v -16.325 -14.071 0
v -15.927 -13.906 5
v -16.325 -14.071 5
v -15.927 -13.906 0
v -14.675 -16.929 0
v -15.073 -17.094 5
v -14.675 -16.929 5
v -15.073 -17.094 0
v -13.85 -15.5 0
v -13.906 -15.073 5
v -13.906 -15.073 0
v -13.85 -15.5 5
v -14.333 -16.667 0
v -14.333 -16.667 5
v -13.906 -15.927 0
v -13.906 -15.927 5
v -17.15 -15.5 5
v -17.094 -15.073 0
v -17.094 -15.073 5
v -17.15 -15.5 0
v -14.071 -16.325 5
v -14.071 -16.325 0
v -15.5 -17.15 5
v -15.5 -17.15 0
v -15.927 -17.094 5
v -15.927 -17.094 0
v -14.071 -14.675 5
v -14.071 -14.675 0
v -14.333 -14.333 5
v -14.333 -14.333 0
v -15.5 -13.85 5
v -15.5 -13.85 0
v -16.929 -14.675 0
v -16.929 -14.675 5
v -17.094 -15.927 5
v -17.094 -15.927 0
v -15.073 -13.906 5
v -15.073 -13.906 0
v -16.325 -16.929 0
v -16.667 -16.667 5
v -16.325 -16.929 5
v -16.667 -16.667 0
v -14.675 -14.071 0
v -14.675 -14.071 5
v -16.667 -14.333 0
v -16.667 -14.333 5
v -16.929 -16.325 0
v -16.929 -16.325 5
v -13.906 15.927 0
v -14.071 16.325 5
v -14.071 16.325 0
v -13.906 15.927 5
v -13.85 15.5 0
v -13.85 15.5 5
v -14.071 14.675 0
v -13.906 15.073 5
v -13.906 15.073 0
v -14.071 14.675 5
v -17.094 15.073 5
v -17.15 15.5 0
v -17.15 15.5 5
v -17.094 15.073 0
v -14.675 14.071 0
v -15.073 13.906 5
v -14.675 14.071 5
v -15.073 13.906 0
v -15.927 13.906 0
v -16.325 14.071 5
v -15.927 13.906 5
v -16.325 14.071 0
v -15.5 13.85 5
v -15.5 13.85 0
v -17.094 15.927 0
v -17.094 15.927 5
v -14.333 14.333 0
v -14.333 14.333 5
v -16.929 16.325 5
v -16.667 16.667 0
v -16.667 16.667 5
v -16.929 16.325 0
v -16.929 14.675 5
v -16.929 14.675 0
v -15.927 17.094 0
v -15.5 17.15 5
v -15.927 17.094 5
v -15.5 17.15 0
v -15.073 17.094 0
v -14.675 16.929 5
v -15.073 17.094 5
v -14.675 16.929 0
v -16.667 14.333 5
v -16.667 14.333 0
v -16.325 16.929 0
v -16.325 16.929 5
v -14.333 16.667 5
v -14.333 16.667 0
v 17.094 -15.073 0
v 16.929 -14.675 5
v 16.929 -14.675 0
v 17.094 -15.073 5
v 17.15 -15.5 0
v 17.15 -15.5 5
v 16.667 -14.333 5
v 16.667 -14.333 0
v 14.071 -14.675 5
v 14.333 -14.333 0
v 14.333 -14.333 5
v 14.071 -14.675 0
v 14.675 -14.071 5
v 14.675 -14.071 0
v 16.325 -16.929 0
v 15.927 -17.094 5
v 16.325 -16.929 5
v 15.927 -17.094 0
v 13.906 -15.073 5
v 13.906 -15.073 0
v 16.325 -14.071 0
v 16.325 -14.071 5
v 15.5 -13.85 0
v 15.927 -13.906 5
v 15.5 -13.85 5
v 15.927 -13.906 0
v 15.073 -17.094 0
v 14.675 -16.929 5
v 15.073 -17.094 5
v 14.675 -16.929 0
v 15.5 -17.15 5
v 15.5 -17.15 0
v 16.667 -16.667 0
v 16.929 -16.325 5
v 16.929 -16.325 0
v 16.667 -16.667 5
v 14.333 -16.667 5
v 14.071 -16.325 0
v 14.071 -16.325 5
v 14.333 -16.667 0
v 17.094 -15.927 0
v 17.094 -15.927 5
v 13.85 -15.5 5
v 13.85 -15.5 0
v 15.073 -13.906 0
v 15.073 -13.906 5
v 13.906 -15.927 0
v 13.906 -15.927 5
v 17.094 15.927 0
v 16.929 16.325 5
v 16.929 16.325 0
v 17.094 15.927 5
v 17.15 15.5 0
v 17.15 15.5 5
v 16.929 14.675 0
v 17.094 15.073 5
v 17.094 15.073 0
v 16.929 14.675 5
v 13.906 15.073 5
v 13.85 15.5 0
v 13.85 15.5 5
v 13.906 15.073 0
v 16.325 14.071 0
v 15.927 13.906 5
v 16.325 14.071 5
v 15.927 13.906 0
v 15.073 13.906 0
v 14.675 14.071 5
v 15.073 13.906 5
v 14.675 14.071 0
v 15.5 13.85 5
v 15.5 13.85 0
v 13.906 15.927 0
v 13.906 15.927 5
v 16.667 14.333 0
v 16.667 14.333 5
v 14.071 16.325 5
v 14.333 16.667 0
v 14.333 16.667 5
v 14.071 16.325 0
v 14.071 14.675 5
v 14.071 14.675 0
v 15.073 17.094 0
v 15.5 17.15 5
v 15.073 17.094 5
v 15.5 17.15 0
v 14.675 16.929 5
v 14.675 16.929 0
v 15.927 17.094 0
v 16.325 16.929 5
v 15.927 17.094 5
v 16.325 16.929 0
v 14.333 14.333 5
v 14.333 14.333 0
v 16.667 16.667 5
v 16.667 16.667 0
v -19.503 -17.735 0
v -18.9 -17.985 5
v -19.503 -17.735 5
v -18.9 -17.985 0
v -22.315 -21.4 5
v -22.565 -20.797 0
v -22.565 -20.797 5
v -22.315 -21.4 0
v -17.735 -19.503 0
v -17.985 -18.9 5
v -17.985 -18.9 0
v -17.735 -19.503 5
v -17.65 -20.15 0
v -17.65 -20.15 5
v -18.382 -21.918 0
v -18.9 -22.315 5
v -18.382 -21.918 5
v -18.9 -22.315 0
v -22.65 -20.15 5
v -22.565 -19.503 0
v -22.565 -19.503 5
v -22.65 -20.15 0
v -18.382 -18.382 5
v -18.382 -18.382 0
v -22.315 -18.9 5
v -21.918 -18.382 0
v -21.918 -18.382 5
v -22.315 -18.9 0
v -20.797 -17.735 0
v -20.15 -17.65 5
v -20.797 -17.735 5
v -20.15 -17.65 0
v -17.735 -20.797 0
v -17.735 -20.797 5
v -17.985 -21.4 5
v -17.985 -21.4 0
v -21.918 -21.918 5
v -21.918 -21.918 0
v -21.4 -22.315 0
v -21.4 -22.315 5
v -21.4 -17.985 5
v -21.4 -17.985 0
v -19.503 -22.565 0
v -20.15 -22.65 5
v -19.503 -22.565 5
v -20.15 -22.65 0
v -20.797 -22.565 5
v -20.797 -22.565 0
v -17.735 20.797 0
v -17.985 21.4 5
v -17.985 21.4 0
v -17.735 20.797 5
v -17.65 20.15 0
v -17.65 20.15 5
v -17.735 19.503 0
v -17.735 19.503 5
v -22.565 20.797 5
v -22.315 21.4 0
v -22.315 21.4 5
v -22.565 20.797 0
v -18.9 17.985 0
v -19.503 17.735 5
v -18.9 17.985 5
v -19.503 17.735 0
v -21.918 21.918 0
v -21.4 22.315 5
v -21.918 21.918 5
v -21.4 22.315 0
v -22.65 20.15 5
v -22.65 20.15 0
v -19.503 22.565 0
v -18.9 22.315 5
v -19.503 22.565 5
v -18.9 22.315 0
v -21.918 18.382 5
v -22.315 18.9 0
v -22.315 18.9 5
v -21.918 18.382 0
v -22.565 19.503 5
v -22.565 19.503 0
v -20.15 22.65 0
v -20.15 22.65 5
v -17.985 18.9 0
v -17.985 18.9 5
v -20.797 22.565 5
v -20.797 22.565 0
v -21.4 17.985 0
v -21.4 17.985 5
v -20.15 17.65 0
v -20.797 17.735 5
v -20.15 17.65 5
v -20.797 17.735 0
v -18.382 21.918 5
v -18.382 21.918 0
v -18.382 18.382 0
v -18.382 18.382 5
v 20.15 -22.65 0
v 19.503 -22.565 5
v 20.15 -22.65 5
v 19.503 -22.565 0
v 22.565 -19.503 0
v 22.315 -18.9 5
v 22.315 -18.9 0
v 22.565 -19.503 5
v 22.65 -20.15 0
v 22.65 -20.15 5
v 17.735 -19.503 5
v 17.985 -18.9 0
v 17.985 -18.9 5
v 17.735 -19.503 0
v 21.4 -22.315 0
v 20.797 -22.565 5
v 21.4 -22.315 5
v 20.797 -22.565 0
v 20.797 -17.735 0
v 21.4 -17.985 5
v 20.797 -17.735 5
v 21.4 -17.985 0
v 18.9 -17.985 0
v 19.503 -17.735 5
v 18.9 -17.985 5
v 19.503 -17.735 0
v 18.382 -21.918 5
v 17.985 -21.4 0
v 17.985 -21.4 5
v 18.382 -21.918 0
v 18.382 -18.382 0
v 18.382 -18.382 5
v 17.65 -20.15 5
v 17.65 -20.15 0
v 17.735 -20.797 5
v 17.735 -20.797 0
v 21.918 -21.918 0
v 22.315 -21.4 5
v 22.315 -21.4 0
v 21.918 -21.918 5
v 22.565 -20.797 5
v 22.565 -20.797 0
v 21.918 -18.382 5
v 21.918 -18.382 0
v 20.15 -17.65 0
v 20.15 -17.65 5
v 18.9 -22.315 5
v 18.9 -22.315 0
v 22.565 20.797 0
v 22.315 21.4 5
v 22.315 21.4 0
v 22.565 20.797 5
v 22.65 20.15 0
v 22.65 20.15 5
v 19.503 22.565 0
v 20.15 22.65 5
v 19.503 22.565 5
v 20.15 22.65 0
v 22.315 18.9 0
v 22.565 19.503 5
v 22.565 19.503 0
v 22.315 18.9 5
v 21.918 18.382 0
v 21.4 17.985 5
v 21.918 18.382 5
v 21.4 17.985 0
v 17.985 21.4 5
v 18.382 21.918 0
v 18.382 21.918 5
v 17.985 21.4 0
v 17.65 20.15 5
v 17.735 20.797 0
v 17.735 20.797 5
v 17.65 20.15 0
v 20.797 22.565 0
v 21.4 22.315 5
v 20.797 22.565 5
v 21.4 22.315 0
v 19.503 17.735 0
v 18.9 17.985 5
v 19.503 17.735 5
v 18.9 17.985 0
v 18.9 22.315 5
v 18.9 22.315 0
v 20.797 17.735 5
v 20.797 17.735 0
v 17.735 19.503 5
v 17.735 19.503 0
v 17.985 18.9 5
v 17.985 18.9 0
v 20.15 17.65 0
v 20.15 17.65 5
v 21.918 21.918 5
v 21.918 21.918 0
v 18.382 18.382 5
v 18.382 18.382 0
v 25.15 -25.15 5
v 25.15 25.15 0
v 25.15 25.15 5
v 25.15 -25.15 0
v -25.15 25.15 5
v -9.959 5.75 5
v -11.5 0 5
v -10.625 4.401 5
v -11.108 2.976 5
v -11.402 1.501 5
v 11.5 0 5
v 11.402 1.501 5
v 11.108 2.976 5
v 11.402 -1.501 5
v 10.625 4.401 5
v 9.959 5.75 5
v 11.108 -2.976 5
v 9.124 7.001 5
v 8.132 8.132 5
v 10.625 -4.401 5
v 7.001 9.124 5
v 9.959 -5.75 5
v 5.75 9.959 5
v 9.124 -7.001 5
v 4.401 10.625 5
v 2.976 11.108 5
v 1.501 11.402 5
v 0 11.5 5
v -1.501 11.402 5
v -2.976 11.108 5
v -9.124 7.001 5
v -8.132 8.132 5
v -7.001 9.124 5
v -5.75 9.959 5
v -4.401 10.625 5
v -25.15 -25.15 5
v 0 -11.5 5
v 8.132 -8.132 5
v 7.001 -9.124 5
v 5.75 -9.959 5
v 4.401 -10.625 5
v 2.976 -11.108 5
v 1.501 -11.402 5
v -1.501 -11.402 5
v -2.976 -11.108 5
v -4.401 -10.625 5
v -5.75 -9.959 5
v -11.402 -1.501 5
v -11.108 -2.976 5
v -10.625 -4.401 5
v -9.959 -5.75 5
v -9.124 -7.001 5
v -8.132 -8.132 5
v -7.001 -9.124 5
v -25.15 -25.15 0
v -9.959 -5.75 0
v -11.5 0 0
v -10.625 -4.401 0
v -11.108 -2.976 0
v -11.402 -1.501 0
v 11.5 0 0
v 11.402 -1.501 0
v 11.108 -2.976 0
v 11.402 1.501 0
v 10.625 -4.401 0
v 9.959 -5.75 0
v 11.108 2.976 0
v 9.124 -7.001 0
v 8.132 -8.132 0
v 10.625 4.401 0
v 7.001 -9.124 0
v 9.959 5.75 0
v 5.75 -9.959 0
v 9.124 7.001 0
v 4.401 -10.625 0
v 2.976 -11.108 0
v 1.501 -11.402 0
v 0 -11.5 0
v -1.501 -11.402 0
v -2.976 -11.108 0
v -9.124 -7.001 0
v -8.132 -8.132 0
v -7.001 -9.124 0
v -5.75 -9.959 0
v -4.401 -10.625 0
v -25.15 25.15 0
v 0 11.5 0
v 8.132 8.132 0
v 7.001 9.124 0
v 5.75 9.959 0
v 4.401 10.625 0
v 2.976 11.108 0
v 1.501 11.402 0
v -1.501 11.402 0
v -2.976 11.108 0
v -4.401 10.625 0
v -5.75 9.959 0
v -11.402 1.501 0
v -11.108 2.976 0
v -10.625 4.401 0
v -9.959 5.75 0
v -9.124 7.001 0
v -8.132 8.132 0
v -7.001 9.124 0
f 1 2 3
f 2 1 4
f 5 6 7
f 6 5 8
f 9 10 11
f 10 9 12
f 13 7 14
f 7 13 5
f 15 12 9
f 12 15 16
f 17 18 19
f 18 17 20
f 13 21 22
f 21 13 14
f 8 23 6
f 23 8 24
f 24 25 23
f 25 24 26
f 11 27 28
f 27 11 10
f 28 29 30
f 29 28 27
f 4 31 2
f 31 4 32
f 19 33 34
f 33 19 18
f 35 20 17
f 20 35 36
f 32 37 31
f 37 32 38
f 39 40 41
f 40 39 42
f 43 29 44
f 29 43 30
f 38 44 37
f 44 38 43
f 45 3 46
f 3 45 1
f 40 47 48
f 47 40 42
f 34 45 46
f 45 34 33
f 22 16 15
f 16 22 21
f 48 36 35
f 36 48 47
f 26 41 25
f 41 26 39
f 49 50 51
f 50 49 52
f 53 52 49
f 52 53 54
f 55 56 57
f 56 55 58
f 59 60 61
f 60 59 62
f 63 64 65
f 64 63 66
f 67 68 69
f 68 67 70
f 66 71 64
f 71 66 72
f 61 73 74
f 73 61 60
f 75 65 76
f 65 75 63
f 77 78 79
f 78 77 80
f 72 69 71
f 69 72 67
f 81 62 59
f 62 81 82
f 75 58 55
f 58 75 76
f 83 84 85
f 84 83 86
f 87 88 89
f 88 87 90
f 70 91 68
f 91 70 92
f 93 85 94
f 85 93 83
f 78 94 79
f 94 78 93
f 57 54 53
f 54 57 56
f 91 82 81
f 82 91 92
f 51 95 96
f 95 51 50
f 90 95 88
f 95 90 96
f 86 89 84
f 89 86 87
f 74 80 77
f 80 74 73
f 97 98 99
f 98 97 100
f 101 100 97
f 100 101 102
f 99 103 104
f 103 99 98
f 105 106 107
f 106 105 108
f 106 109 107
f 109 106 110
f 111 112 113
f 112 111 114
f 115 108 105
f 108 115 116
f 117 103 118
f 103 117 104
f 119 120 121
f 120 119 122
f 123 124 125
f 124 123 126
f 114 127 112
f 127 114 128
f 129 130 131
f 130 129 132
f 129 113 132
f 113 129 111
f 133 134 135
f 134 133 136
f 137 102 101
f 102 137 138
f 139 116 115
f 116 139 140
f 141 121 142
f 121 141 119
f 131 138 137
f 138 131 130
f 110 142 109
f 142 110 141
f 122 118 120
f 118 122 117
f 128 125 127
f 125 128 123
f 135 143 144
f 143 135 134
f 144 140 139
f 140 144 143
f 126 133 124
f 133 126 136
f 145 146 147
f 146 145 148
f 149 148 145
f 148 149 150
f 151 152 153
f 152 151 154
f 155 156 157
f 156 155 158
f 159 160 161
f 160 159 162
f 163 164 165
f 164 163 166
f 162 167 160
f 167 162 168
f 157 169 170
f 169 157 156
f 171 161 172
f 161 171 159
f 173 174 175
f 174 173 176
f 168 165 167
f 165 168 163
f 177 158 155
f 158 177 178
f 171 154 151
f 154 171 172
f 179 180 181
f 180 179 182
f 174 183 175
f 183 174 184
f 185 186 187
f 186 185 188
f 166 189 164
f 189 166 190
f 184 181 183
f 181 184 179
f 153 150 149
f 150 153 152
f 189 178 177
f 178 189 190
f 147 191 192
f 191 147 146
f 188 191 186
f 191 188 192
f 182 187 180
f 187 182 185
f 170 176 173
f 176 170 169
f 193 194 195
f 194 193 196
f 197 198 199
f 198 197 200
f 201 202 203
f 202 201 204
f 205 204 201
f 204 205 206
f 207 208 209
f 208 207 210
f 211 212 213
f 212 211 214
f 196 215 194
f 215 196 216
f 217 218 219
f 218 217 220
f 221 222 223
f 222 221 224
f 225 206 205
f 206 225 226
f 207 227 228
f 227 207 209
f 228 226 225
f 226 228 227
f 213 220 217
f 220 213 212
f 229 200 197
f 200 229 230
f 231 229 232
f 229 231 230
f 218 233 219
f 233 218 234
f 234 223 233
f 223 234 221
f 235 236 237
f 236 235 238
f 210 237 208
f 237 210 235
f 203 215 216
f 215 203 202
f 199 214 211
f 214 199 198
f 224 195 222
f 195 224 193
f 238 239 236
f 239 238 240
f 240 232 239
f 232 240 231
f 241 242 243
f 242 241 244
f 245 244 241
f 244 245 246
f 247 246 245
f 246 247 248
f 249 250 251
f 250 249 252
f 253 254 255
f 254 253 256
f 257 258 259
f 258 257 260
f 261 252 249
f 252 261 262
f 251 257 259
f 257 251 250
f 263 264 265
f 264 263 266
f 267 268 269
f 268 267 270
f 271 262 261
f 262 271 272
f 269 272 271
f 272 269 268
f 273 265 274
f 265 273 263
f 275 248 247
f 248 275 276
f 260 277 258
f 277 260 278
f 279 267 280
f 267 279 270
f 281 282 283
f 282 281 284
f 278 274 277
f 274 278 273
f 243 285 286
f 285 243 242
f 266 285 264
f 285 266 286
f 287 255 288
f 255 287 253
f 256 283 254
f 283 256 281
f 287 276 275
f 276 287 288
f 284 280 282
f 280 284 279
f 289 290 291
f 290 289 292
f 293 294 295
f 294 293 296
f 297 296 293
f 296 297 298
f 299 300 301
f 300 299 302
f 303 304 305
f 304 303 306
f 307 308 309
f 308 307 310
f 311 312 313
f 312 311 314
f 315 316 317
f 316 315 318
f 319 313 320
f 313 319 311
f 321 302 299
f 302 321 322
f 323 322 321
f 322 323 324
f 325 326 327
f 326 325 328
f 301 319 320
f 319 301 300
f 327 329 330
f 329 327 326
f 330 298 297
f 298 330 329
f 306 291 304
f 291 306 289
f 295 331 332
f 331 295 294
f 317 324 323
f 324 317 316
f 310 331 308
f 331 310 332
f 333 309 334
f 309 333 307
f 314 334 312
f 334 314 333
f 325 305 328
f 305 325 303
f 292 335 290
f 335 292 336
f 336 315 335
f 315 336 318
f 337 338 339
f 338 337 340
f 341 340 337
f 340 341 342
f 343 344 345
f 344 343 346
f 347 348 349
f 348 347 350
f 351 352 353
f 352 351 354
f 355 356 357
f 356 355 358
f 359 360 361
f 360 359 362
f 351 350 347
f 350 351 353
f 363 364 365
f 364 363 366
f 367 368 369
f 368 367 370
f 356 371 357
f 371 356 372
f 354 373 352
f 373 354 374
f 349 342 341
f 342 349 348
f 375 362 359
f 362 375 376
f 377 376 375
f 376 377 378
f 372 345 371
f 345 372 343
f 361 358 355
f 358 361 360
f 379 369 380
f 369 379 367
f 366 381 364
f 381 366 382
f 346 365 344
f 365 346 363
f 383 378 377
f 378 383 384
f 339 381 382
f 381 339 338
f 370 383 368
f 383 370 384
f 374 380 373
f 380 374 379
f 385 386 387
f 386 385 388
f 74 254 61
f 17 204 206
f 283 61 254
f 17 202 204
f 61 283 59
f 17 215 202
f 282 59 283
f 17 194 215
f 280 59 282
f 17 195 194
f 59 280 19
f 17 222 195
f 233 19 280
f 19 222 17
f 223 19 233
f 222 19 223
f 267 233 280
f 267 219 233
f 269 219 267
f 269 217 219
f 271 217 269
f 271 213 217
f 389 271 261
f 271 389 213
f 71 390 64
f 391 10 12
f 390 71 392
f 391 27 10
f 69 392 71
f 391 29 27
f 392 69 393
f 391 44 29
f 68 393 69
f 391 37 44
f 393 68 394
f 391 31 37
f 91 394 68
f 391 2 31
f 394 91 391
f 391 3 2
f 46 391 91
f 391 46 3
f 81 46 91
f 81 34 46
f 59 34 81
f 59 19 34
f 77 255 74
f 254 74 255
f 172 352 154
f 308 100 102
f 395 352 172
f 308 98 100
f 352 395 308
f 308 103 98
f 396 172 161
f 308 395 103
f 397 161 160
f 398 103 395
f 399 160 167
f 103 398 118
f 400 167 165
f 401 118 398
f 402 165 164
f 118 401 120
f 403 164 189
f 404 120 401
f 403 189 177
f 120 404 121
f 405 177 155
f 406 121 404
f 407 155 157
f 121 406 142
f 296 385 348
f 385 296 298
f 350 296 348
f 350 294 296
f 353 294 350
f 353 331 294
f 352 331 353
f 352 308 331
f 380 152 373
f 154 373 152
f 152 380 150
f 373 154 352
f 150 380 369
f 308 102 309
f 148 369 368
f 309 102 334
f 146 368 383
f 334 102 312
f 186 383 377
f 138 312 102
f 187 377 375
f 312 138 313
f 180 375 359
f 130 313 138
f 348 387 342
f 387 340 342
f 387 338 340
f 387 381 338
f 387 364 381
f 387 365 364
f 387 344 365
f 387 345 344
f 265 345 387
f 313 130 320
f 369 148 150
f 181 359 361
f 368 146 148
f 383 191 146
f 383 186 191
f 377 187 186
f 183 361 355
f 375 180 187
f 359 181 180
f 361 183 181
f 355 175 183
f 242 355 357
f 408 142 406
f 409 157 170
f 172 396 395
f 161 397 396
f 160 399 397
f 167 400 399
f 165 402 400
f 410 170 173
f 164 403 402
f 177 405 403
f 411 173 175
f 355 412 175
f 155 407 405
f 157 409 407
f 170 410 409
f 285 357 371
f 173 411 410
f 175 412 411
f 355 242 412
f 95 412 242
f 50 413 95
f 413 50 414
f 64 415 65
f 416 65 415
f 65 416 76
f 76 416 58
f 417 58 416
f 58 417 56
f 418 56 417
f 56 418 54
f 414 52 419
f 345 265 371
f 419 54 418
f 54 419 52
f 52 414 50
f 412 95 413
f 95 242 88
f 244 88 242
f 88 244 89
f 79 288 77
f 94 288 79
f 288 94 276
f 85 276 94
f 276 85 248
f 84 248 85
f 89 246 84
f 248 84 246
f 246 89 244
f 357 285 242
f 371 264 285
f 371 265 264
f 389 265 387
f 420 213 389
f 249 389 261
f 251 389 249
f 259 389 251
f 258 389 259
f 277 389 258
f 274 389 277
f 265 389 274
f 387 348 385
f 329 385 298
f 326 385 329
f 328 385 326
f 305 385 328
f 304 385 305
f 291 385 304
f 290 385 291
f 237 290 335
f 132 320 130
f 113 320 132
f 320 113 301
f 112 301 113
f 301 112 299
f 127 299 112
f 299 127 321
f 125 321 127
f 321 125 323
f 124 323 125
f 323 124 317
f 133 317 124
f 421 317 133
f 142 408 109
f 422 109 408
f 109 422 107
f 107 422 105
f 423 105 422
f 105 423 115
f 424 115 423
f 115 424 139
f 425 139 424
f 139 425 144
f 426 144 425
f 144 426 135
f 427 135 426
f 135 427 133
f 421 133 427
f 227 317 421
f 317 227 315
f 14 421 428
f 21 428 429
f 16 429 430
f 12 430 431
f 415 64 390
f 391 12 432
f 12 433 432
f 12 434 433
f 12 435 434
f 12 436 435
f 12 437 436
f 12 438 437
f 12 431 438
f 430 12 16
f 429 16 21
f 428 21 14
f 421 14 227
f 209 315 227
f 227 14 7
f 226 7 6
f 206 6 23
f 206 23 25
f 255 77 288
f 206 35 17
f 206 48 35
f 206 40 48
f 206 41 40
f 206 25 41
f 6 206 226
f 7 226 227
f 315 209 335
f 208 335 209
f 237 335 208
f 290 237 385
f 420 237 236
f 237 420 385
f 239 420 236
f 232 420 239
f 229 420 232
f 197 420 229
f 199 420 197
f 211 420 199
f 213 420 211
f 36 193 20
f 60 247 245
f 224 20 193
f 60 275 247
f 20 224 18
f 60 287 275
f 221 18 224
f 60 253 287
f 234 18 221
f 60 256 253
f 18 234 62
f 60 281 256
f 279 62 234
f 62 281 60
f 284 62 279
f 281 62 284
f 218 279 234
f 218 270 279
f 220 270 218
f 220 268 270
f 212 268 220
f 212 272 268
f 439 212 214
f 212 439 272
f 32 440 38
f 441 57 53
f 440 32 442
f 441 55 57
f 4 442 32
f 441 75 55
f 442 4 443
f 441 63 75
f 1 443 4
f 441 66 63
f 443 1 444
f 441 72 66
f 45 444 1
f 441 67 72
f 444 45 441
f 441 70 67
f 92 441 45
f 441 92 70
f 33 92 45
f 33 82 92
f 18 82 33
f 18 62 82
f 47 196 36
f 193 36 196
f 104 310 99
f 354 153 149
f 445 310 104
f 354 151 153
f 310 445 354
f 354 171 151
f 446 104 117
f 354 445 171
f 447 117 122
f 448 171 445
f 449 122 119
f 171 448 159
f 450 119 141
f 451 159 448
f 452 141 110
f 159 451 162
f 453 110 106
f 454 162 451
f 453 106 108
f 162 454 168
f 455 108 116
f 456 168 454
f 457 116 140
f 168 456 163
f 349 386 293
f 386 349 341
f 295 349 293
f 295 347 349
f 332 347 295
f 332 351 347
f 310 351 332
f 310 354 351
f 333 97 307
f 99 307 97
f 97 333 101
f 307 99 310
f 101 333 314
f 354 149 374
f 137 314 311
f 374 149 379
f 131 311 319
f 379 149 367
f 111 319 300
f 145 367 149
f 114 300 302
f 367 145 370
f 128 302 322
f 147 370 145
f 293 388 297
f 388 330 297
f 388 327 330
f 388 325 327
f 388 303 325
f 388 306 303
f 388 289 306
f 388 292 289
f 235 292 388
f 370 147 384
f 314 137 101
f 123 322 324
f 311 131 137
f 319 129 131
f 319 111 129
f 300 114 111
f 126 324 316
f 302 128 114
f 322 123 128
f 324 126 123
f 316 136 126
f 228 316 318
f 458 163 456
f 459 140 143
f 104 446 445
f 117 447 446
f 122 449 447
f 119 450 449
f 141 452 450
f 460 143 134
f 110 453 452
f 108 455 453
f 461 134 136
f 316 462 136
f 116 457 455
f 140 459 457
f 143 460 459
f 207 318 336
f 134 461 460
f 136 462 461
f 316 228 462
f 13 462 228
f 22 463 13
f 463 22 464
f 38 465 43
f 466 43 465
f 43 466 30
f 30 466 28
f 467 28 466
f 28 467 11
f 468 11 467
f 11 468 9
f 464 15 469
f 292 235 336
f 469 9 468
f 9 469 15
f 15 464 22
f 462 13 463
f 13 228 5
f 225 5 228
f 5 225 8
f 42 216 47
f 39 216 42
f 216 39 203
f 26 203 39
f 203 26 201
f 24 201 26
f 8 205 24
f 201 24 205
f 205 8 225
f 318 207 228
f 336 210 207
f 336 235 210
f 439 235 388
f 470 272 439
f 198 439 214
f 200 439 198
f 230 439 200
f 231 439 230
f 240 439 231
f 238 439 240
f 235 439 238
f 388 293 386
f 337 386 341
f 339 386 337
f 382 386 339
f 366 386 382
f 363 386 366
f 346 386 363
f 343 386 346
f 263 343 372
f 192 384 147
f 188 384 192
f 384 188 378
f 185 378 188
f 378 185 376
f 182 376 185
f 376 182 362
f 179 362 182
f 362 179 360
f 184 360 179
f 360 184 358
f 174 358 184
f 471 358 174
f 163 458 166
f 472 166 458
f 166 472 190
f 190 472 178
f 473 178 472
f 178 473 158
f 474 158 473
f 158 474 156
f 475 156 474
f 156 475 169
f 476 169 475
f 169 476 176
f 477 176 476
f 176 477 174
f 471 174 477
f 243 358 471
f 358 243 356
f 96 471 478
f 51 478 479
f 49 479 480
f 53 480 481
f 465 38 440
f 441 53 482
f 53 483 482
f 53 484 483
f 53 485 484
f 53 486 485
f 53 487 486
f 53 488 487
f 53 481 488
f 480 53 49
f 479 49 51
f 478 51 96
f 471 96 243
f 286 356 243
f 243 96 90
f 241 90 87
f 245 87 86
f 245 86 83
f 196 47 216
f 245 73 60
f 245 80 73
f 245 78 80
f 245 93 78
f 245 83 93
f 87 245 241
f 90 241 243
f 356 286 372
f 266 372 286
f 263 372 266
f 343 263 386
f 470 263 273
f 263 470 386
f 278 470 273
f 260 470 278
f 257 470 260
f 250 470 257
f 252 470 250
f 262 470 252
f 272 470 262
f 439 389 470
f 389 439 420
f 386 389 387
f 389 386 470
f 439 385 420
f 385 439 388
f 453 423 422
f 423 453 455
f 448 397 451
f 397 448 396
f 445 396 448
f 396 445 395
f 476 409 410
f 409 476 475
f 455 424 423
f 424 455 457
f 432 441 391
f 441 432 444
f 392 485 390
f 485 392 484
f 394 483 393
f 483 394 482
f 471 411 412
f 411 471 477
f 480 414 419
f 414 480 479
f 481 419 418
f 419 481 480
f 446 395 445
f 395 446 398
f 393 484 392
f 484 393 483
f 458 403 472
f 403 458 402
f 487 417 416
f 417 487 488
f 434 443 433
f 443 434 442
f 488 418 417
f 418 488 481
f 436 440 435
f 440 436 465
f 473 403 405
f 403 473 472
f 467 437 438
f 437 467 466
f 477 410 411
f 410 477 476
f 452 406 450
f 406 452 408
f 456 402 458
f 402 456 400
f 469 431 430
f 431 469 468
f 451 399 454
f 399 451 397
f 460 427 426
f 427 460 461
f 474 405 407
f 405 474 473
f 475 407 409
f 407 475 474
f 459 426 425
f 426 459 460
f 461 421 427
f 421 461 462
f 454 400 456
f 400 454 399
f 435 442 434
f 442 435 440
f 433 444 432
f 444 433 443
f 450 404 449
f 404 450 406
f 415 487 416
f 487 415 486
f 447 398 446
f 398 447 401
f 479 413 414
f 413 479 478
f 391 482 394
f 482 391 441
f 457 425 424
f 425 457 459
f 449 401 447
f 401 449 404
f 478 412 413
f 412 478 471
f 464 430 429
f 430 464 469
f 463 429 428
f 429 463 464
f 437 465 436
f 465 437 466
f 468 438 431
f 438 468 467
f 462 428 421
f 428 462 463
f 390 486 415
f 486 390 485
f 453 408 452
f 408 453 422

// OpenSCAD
// Qubic NEMA Motor Mount
// Parametric motor bracket for NEMA 17/23/34 stepper motors
// Uses NopSCADlib dimensions for accurate motor hole patterns

// --- Parameters (overridden by platform) ---
nema_size = 17;
wall_thickness = 4;
base_thickness = 5;
mounting_style = 0;  // 0 = flat plate, 1 = L-bracket
fn = 0;
render_mode = 0;

$fn = fn > 0 ? fn : 48;

// NEMA motor dimensions lookup
// [face_width, hole_spacing, shaft_hole_d, screw_d, body_length]
function nema_dims(size) =
    size == 17 ? [42.3, 31, 22, 3, 48] :
    size == 23 ? [56.4, 47.14, 38.1, 5.5, 56] :
    size == 34 ? [86.0, 69.6, 73, 5.5, 66] :
    [42.3, 31, 22, 3, 48];  // default to 17

dims = nema_dims(nema_size);
face_w = dims[0];
hole_spacing = dims[1];
shaft_hole_d = dims[2];
screw_d = dims[3];
body_len = dims[4];

plate_size = face_w + wall_thickness * 2;
bracket_height = mounting_style == 1 ? face_w : 0;

// Mounting base holes
mount_hole_d = 5;
mount_hole_spacing = plate_size - 10;

module motor_plate() {
    difference() {
        // Base plate
        translate([-plate_size/2, -plate_size/2, 0])
            cube([plate_size, plate_size, base_thickness]);

        // Center shaft hole
        translate([0, 0, -1])
            cylinder(d=shaft_hole_d + 1, h=base_thickness + 2, $fn=$fn);

        // Motor screw holes (4 corners)
        for (x = [-1, 1], y = [-1, 1])
            translate([x * hole_spacing/2, y * hole_spacing/2, -1])
                cylinder(d=screw_d + 0.3, h=base_thickness + 2, $fn=24);

        // Mounting holes for attaching to surface
        for (x = [-1, 1], y = [-1, 1])
            translate([x * mount_hole_spacing/2, y * mount_hole_spacing/2, -1])
                cylinder(d=mount_hole_d, h=base_thickness + 2, $fn=24);
    }
}

module l_bracket() {
    motor_plate();

    // Vertical bracket wall
    translate([-plate_size/2, -plate_size/2, 0])
        difference() {
            cube([plate_size, wall_thickness, bracket_height + base_thickness]);
            // Lightening holes
            translate([plate_size/2, -1, bracket_height/2 + base_thickness])
                rotate([-90, 0, 0])
                    cylinder(d=bracket_height * 0.5, h=wall_thickness + 2, $fn=$fn);
        }
}

// --- Render mode dispatch ---
if (render_mode == 0) {
    if (mounting_style == 0) {
        motor_plate();
    } else {
        l_bracket();
    }
}
// render_mode == 1 is for static_stl (NEMA reference) — handled by platform
